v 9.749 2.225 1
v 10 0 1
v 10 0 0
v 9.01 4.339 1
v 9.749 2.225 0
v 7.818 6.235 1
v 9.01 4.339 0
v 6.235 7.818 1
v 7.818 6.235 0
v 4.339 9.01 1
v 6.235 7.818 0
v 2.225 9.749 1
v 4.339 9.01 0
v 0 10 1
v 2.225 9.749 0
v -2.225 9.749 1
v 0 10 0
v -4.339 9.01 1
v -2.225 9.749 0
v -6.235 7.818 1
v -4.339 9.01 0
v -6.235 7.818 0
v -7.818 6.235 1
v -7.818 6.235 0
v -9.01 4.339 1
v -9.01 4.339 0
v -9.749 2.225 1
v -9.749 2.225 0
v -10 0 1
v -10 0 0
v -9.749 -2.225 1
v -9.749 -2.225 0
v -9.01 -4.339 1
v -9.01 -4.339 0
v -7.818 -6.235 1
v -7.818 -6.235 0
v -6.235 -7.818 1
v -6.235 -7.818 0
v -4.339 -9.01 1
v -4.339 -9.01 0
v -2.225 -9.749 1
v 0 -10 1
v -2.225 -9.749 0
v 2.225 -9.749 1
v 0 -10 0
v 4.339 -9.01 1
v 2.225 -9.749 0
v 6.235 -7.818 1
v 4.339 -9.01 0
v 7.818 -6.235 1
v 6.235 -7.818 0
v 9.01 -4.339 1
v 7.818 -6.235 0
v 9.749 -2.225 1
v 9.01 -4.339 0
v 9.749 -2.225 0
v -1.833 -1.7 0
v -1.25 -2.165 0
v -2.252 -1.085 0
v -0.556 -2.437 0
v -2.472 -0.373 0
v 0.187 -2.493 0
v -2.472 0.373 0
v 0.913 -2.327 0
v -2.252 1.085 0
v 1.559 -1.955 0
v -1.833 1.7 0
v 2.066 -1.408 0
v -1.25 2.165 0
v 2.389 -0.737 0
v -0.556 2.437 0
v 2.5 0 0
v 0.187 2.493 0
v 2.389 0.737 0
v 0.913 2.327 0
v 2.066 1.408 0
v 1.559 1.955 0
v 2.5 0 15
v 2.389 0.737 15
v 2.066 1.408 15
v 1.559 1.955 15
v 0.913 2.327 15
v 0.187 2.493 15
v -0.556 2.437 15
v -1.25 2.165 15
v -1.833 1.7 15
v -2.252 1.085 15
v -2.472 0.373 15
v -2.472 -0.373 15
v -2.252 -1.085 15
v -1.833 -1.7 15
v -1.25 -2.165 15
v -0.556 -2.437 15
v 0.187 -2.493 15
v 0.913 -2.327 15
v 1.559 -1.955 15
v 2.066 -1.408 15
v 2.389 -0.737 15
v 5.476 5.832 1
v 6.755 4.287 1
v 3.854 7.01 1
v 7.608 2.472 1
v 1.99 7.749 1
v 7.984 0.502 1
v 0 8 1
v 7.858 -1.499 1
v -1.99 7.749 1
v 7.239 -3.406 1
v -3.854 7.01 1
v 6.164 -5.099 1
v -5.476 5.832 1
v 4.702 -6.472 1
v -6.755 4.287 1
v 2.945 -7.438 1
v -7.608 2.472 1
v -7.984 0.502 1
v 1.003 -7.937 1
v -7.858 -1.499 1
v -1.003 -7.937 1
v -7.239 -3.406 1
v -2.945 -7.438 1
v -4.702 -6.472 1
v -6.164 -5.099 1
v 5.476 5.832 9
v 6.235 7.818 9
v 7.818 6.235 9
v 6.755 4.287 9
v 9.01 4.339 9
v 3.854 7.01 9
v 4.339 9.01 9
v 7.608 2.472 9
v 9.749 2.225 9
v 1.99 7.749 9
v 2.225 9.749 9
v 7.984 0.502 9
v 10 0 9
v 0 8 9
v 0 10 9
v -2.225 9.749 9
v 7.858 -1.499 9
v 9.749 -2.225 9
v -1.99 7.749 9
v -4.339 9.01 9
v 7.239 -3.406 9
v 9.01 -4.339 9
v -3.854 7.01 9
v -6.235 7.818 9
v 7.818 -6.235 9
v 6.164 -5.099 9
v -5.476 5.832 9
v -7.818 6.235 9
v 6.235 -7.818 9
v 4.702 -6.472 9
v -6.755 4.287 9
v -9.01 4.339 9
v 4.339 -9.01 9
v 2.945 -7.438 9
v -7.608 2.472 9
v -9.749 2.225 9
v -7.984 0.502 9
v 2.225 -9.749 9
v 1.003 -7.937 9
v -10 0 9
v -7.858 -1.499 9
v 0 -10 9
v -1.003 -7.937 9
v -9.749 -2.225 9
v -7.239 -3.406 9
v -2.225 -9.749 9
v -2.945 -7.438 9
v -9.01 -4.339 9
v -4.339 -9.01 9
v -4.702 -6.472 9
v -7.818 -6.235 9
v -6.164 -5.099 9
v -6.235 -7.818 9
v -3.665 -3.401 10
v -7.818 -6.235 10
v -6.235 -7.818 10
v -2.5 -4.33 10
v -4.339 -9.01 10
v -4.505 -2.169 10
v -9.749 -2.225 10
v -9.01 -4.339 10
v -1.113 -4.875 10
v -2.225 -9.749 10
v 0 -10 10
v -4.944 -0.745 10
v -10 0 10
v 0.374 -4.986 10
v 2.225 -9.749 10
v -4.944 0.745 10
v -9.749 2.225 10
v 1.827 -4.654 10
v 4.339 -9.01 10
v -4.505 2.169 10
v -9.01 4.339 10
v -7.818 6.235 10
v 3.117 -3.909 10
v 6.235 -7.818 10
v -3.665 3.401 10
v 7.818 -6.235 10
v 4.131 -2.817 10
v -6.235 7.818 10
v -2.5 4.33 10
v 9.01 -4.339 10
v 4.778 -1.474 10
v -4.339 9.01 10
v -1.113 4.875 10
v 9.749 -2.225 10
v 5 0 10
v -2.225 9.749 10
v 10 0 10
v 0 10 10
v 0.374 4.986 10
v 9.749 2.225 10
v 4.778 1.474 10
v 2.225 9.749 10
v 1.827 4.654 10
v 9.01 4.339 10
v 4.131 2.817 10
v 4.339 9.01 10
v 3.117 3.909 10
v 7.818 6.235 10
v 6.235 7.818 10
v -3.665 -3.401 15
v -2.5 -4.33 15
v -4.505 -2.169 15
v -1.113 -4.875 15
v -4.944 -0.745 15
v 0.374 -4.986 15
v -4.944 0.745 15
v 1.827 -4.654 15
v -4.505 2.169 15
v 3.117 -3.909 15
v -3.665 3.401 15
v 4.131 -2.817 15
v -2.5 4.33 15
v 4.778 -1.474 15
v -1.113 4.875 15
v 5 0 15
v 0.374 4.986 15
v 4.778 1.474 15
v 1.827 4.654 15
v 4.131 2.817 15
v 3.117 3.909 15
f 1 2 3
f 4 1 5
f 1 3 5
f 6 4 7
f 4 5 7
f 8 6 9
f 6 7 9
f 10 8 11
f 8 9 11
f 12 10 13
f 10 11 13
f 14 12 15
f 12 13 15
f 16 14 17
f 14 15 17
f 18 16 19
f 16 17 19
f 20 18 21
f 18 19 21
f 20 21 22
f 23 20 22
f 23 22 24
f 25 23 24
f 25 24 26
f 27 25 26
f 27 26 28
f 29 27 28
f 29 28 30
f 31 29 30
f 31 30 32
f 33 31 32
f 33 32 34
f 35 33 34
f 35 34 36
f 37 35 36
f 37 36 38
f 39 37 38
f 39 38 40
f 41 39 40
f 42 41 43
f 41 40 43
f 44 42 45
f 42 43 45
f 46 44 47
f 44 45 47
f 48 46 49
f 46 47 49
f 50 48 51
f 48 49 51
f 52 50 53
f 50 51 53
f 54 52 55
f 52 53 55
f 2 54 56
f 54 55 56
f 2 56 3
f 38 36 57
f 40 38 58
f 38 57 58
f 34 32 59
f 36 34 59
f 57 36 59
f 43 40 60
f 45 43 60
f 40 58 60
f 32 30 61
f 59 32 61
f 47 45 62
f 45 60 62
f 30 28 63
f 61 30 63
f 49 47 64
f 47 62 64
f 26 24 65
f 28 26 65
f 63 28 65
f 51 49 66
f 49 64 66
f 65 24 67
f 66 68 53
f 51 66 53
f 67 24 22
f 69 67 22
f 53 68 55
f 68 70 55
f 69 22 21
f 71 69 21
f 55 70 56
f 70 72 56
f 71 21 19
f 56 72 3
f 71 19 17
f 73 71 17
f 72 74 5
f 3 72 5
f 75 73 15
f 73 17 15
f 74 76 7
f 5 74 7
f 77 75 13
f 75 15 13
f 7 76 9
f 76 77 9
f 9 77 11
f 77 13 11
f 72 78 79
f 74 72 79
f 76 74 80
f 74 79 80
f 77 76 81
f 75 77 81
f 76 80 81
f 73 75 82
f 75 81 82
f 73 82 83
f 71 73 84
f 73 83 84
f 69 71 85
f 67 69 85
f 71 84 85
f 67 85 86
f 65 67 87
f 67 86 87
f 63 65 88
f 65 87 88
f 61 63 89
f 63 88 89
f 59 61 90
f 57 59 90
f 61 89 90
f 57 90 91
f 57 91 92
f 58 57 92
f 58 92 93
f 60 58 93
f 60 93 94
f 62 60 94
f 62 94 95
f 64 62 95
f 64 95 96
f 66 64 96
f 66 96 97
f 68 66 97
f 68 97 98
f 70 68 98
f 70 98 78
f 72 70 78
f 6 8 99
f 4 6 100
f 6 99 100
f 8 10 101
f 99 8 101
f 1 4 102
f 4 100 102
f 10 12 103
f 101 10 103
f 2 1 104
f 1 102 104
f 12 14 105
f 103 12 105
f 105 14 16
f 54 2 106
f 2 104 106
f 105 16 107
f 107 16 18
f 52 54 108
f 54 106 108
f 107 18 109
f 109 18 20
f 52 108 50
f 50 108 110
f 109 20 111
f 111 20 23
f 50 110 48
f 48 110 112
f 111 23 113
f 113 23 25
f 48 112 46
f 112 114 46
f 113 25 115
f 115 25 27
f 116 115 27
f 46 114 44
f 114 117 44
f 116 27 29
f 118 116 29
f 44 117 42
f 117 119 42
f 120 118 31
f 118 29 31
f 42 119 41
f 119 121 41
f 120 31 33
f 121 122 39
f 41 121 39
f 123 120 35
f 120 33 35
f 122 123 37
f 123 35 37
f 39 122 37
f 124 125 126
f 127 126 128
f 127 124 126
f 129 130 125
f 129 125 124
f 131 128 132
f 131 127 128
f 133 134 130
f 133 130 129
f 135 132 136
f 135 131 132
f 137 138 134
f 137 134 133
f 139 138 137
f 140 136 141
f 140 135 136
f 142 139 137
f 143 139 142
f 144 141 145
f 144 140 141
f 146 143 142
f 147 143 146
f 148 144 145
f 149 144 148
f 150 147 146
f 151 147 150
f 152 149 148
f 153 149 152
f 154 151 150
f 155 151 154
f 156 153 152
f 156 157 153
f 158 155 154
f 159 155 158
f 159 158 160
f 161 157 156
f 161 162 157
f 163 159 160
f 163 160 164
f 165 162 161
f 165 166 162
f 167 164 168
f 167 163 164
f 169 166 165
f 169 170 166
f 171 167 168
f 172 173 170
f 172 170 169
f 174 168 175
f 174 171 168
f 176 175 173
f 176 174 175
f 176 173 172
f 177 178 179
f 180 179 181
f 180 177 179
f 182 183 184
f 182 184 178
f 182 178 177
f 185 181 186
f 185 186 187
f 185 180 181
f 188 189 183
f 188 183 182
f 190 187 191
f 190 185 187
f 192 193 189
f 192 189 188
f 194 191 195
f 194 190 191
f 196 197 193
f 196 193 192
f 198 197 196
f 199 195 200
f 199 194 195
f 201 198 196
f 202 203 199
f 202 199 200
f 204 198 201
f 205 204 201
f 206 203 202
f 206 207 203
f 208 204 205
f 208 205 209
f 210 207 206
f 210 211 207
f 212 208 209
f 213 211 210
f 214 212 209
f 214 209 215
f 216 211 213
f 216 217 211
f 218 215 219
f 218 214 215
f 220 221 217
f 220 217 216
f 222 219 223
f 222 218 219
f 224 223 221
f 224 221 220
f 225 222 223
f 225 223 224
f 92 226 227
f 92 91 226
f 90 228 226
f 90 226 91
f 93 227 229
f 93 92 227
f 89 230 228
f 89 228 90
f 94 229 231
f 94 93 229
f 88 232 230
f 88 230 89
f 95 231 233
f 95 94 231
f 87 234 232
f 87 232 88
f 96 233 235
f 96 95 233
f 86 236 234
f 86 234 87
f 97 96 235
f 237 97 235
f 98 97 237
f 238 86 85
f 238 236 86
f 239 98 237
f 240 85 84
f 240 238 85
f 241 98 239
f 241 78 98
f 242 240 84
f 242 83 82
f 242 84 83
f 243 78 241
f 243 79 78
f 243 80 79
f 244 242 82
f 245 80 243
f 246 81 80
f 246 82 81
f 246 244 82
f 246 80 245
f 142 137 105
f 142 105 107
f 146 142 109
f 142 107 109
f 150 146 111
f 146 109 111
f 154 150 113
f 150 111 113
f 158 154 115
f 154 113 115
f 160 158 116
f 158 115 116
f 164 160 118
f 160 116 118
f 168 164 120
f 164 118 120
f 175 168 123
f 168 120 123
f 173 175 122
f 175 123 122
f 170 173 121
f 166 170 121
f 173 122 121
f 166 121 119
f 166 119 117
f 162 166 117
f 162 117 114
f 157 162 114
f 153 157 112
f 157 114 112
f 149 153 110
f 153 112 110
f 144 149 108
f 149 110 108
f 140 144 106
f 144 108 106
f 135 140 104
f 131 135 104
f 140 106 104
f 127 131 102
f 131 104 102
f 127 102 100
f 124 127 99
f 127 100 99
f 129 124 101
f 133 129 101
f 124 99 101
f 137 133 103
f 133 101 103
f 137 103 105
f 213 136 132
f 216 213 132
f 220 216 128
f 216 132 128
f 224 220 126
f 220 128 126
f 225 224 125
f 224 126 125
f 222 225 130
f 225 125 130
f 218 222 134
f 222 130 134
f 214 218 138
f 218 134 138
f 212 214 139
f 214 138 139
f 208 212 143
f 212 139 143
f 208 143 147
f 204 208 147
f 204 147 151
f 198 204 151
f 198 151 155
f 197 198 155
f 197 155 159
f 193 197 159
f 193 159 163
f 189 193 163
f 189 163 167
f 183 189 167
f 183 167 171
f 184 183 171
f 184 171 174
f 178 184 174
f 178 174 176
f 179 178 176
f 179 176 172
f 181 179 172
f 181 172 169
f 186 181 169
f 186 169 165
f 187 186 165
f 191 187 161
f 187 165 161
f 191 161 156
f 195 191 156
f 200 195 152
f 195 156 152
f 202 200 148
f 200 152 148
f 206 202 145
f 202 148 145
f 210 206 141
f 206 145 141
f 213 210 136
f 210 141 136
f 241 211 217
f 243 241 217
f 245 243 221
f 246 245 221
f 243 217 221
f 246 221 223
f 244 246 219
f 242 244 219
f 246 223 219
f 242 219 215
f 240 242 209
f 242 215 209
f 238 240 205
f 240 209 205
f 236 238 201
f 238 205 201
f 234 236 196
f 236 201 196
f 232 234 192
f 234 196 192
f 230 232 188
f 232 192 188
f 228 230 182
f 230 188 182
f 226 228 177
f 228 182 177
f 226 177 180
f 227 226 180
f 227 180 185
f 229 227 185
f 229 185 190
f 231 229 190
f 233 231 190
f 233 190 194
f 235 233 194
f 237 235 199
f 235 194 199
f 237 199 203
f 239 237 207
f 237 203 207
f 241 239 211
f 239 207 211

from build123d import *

# Parameters (mm, degrees)
ESQUISSE1_R             = 10
BOSS_EXTRU_1_DEPTH      = 10
ESQUISSE2_R             = 5
BOSS_EXTRU_2_DEPTH      = 5
ESQUISSE3_R             = 2.5
ENL_V_MAT_EXTRU_1_DEPTH = 16
ESQUISSE4_W             = 8
ESQUISSE4_H             = 2


with BuildPart() as part:
    # Esquisse1 → Boss.-Extru.1 (new body)
    with BuildSketch(Plane.XY):
        Circle(ESQUISSE1_R)
    extrude(amount=BOSS_EXTRU_1_DEPTH)

    # Esquisse2 → Boss.-Extru.2 (add)
    with BuildSketch(Plane.XY.offset(10)):
        Circle(ESQUISSE2_R)
    extrude(amount=BOSS_EXTRU_2_DEPTH)

    # Esquisse3 → Enlèv. mat.-Extru.1 (cut, through all)
    with BuildSketch(Plane.XY.offset(15)):
        Circle(ESQUISSE3_R)
    extrude(amount=-ENL_V_MAT_EXTRU_1_DEPTH, mode=Mode.SUBTRACT)

    # Esquisse4 → Enlèvement de matière-Révolution1 (revolve, cut)
    with BuildSketch(Plane(origin=(0, 0, 0), x_dir=(0, 0, -1), z_dir=(1, 0, 0))):
        with Locations((-5, 9)):
            Rectangle(ESQUISSE4_W, ESQUISSE4_H)
    revolve(axis=Axis((0, 0, 0), (0, 0, 1)), mode=Mode.SUBTRACT)


solid = part.part
